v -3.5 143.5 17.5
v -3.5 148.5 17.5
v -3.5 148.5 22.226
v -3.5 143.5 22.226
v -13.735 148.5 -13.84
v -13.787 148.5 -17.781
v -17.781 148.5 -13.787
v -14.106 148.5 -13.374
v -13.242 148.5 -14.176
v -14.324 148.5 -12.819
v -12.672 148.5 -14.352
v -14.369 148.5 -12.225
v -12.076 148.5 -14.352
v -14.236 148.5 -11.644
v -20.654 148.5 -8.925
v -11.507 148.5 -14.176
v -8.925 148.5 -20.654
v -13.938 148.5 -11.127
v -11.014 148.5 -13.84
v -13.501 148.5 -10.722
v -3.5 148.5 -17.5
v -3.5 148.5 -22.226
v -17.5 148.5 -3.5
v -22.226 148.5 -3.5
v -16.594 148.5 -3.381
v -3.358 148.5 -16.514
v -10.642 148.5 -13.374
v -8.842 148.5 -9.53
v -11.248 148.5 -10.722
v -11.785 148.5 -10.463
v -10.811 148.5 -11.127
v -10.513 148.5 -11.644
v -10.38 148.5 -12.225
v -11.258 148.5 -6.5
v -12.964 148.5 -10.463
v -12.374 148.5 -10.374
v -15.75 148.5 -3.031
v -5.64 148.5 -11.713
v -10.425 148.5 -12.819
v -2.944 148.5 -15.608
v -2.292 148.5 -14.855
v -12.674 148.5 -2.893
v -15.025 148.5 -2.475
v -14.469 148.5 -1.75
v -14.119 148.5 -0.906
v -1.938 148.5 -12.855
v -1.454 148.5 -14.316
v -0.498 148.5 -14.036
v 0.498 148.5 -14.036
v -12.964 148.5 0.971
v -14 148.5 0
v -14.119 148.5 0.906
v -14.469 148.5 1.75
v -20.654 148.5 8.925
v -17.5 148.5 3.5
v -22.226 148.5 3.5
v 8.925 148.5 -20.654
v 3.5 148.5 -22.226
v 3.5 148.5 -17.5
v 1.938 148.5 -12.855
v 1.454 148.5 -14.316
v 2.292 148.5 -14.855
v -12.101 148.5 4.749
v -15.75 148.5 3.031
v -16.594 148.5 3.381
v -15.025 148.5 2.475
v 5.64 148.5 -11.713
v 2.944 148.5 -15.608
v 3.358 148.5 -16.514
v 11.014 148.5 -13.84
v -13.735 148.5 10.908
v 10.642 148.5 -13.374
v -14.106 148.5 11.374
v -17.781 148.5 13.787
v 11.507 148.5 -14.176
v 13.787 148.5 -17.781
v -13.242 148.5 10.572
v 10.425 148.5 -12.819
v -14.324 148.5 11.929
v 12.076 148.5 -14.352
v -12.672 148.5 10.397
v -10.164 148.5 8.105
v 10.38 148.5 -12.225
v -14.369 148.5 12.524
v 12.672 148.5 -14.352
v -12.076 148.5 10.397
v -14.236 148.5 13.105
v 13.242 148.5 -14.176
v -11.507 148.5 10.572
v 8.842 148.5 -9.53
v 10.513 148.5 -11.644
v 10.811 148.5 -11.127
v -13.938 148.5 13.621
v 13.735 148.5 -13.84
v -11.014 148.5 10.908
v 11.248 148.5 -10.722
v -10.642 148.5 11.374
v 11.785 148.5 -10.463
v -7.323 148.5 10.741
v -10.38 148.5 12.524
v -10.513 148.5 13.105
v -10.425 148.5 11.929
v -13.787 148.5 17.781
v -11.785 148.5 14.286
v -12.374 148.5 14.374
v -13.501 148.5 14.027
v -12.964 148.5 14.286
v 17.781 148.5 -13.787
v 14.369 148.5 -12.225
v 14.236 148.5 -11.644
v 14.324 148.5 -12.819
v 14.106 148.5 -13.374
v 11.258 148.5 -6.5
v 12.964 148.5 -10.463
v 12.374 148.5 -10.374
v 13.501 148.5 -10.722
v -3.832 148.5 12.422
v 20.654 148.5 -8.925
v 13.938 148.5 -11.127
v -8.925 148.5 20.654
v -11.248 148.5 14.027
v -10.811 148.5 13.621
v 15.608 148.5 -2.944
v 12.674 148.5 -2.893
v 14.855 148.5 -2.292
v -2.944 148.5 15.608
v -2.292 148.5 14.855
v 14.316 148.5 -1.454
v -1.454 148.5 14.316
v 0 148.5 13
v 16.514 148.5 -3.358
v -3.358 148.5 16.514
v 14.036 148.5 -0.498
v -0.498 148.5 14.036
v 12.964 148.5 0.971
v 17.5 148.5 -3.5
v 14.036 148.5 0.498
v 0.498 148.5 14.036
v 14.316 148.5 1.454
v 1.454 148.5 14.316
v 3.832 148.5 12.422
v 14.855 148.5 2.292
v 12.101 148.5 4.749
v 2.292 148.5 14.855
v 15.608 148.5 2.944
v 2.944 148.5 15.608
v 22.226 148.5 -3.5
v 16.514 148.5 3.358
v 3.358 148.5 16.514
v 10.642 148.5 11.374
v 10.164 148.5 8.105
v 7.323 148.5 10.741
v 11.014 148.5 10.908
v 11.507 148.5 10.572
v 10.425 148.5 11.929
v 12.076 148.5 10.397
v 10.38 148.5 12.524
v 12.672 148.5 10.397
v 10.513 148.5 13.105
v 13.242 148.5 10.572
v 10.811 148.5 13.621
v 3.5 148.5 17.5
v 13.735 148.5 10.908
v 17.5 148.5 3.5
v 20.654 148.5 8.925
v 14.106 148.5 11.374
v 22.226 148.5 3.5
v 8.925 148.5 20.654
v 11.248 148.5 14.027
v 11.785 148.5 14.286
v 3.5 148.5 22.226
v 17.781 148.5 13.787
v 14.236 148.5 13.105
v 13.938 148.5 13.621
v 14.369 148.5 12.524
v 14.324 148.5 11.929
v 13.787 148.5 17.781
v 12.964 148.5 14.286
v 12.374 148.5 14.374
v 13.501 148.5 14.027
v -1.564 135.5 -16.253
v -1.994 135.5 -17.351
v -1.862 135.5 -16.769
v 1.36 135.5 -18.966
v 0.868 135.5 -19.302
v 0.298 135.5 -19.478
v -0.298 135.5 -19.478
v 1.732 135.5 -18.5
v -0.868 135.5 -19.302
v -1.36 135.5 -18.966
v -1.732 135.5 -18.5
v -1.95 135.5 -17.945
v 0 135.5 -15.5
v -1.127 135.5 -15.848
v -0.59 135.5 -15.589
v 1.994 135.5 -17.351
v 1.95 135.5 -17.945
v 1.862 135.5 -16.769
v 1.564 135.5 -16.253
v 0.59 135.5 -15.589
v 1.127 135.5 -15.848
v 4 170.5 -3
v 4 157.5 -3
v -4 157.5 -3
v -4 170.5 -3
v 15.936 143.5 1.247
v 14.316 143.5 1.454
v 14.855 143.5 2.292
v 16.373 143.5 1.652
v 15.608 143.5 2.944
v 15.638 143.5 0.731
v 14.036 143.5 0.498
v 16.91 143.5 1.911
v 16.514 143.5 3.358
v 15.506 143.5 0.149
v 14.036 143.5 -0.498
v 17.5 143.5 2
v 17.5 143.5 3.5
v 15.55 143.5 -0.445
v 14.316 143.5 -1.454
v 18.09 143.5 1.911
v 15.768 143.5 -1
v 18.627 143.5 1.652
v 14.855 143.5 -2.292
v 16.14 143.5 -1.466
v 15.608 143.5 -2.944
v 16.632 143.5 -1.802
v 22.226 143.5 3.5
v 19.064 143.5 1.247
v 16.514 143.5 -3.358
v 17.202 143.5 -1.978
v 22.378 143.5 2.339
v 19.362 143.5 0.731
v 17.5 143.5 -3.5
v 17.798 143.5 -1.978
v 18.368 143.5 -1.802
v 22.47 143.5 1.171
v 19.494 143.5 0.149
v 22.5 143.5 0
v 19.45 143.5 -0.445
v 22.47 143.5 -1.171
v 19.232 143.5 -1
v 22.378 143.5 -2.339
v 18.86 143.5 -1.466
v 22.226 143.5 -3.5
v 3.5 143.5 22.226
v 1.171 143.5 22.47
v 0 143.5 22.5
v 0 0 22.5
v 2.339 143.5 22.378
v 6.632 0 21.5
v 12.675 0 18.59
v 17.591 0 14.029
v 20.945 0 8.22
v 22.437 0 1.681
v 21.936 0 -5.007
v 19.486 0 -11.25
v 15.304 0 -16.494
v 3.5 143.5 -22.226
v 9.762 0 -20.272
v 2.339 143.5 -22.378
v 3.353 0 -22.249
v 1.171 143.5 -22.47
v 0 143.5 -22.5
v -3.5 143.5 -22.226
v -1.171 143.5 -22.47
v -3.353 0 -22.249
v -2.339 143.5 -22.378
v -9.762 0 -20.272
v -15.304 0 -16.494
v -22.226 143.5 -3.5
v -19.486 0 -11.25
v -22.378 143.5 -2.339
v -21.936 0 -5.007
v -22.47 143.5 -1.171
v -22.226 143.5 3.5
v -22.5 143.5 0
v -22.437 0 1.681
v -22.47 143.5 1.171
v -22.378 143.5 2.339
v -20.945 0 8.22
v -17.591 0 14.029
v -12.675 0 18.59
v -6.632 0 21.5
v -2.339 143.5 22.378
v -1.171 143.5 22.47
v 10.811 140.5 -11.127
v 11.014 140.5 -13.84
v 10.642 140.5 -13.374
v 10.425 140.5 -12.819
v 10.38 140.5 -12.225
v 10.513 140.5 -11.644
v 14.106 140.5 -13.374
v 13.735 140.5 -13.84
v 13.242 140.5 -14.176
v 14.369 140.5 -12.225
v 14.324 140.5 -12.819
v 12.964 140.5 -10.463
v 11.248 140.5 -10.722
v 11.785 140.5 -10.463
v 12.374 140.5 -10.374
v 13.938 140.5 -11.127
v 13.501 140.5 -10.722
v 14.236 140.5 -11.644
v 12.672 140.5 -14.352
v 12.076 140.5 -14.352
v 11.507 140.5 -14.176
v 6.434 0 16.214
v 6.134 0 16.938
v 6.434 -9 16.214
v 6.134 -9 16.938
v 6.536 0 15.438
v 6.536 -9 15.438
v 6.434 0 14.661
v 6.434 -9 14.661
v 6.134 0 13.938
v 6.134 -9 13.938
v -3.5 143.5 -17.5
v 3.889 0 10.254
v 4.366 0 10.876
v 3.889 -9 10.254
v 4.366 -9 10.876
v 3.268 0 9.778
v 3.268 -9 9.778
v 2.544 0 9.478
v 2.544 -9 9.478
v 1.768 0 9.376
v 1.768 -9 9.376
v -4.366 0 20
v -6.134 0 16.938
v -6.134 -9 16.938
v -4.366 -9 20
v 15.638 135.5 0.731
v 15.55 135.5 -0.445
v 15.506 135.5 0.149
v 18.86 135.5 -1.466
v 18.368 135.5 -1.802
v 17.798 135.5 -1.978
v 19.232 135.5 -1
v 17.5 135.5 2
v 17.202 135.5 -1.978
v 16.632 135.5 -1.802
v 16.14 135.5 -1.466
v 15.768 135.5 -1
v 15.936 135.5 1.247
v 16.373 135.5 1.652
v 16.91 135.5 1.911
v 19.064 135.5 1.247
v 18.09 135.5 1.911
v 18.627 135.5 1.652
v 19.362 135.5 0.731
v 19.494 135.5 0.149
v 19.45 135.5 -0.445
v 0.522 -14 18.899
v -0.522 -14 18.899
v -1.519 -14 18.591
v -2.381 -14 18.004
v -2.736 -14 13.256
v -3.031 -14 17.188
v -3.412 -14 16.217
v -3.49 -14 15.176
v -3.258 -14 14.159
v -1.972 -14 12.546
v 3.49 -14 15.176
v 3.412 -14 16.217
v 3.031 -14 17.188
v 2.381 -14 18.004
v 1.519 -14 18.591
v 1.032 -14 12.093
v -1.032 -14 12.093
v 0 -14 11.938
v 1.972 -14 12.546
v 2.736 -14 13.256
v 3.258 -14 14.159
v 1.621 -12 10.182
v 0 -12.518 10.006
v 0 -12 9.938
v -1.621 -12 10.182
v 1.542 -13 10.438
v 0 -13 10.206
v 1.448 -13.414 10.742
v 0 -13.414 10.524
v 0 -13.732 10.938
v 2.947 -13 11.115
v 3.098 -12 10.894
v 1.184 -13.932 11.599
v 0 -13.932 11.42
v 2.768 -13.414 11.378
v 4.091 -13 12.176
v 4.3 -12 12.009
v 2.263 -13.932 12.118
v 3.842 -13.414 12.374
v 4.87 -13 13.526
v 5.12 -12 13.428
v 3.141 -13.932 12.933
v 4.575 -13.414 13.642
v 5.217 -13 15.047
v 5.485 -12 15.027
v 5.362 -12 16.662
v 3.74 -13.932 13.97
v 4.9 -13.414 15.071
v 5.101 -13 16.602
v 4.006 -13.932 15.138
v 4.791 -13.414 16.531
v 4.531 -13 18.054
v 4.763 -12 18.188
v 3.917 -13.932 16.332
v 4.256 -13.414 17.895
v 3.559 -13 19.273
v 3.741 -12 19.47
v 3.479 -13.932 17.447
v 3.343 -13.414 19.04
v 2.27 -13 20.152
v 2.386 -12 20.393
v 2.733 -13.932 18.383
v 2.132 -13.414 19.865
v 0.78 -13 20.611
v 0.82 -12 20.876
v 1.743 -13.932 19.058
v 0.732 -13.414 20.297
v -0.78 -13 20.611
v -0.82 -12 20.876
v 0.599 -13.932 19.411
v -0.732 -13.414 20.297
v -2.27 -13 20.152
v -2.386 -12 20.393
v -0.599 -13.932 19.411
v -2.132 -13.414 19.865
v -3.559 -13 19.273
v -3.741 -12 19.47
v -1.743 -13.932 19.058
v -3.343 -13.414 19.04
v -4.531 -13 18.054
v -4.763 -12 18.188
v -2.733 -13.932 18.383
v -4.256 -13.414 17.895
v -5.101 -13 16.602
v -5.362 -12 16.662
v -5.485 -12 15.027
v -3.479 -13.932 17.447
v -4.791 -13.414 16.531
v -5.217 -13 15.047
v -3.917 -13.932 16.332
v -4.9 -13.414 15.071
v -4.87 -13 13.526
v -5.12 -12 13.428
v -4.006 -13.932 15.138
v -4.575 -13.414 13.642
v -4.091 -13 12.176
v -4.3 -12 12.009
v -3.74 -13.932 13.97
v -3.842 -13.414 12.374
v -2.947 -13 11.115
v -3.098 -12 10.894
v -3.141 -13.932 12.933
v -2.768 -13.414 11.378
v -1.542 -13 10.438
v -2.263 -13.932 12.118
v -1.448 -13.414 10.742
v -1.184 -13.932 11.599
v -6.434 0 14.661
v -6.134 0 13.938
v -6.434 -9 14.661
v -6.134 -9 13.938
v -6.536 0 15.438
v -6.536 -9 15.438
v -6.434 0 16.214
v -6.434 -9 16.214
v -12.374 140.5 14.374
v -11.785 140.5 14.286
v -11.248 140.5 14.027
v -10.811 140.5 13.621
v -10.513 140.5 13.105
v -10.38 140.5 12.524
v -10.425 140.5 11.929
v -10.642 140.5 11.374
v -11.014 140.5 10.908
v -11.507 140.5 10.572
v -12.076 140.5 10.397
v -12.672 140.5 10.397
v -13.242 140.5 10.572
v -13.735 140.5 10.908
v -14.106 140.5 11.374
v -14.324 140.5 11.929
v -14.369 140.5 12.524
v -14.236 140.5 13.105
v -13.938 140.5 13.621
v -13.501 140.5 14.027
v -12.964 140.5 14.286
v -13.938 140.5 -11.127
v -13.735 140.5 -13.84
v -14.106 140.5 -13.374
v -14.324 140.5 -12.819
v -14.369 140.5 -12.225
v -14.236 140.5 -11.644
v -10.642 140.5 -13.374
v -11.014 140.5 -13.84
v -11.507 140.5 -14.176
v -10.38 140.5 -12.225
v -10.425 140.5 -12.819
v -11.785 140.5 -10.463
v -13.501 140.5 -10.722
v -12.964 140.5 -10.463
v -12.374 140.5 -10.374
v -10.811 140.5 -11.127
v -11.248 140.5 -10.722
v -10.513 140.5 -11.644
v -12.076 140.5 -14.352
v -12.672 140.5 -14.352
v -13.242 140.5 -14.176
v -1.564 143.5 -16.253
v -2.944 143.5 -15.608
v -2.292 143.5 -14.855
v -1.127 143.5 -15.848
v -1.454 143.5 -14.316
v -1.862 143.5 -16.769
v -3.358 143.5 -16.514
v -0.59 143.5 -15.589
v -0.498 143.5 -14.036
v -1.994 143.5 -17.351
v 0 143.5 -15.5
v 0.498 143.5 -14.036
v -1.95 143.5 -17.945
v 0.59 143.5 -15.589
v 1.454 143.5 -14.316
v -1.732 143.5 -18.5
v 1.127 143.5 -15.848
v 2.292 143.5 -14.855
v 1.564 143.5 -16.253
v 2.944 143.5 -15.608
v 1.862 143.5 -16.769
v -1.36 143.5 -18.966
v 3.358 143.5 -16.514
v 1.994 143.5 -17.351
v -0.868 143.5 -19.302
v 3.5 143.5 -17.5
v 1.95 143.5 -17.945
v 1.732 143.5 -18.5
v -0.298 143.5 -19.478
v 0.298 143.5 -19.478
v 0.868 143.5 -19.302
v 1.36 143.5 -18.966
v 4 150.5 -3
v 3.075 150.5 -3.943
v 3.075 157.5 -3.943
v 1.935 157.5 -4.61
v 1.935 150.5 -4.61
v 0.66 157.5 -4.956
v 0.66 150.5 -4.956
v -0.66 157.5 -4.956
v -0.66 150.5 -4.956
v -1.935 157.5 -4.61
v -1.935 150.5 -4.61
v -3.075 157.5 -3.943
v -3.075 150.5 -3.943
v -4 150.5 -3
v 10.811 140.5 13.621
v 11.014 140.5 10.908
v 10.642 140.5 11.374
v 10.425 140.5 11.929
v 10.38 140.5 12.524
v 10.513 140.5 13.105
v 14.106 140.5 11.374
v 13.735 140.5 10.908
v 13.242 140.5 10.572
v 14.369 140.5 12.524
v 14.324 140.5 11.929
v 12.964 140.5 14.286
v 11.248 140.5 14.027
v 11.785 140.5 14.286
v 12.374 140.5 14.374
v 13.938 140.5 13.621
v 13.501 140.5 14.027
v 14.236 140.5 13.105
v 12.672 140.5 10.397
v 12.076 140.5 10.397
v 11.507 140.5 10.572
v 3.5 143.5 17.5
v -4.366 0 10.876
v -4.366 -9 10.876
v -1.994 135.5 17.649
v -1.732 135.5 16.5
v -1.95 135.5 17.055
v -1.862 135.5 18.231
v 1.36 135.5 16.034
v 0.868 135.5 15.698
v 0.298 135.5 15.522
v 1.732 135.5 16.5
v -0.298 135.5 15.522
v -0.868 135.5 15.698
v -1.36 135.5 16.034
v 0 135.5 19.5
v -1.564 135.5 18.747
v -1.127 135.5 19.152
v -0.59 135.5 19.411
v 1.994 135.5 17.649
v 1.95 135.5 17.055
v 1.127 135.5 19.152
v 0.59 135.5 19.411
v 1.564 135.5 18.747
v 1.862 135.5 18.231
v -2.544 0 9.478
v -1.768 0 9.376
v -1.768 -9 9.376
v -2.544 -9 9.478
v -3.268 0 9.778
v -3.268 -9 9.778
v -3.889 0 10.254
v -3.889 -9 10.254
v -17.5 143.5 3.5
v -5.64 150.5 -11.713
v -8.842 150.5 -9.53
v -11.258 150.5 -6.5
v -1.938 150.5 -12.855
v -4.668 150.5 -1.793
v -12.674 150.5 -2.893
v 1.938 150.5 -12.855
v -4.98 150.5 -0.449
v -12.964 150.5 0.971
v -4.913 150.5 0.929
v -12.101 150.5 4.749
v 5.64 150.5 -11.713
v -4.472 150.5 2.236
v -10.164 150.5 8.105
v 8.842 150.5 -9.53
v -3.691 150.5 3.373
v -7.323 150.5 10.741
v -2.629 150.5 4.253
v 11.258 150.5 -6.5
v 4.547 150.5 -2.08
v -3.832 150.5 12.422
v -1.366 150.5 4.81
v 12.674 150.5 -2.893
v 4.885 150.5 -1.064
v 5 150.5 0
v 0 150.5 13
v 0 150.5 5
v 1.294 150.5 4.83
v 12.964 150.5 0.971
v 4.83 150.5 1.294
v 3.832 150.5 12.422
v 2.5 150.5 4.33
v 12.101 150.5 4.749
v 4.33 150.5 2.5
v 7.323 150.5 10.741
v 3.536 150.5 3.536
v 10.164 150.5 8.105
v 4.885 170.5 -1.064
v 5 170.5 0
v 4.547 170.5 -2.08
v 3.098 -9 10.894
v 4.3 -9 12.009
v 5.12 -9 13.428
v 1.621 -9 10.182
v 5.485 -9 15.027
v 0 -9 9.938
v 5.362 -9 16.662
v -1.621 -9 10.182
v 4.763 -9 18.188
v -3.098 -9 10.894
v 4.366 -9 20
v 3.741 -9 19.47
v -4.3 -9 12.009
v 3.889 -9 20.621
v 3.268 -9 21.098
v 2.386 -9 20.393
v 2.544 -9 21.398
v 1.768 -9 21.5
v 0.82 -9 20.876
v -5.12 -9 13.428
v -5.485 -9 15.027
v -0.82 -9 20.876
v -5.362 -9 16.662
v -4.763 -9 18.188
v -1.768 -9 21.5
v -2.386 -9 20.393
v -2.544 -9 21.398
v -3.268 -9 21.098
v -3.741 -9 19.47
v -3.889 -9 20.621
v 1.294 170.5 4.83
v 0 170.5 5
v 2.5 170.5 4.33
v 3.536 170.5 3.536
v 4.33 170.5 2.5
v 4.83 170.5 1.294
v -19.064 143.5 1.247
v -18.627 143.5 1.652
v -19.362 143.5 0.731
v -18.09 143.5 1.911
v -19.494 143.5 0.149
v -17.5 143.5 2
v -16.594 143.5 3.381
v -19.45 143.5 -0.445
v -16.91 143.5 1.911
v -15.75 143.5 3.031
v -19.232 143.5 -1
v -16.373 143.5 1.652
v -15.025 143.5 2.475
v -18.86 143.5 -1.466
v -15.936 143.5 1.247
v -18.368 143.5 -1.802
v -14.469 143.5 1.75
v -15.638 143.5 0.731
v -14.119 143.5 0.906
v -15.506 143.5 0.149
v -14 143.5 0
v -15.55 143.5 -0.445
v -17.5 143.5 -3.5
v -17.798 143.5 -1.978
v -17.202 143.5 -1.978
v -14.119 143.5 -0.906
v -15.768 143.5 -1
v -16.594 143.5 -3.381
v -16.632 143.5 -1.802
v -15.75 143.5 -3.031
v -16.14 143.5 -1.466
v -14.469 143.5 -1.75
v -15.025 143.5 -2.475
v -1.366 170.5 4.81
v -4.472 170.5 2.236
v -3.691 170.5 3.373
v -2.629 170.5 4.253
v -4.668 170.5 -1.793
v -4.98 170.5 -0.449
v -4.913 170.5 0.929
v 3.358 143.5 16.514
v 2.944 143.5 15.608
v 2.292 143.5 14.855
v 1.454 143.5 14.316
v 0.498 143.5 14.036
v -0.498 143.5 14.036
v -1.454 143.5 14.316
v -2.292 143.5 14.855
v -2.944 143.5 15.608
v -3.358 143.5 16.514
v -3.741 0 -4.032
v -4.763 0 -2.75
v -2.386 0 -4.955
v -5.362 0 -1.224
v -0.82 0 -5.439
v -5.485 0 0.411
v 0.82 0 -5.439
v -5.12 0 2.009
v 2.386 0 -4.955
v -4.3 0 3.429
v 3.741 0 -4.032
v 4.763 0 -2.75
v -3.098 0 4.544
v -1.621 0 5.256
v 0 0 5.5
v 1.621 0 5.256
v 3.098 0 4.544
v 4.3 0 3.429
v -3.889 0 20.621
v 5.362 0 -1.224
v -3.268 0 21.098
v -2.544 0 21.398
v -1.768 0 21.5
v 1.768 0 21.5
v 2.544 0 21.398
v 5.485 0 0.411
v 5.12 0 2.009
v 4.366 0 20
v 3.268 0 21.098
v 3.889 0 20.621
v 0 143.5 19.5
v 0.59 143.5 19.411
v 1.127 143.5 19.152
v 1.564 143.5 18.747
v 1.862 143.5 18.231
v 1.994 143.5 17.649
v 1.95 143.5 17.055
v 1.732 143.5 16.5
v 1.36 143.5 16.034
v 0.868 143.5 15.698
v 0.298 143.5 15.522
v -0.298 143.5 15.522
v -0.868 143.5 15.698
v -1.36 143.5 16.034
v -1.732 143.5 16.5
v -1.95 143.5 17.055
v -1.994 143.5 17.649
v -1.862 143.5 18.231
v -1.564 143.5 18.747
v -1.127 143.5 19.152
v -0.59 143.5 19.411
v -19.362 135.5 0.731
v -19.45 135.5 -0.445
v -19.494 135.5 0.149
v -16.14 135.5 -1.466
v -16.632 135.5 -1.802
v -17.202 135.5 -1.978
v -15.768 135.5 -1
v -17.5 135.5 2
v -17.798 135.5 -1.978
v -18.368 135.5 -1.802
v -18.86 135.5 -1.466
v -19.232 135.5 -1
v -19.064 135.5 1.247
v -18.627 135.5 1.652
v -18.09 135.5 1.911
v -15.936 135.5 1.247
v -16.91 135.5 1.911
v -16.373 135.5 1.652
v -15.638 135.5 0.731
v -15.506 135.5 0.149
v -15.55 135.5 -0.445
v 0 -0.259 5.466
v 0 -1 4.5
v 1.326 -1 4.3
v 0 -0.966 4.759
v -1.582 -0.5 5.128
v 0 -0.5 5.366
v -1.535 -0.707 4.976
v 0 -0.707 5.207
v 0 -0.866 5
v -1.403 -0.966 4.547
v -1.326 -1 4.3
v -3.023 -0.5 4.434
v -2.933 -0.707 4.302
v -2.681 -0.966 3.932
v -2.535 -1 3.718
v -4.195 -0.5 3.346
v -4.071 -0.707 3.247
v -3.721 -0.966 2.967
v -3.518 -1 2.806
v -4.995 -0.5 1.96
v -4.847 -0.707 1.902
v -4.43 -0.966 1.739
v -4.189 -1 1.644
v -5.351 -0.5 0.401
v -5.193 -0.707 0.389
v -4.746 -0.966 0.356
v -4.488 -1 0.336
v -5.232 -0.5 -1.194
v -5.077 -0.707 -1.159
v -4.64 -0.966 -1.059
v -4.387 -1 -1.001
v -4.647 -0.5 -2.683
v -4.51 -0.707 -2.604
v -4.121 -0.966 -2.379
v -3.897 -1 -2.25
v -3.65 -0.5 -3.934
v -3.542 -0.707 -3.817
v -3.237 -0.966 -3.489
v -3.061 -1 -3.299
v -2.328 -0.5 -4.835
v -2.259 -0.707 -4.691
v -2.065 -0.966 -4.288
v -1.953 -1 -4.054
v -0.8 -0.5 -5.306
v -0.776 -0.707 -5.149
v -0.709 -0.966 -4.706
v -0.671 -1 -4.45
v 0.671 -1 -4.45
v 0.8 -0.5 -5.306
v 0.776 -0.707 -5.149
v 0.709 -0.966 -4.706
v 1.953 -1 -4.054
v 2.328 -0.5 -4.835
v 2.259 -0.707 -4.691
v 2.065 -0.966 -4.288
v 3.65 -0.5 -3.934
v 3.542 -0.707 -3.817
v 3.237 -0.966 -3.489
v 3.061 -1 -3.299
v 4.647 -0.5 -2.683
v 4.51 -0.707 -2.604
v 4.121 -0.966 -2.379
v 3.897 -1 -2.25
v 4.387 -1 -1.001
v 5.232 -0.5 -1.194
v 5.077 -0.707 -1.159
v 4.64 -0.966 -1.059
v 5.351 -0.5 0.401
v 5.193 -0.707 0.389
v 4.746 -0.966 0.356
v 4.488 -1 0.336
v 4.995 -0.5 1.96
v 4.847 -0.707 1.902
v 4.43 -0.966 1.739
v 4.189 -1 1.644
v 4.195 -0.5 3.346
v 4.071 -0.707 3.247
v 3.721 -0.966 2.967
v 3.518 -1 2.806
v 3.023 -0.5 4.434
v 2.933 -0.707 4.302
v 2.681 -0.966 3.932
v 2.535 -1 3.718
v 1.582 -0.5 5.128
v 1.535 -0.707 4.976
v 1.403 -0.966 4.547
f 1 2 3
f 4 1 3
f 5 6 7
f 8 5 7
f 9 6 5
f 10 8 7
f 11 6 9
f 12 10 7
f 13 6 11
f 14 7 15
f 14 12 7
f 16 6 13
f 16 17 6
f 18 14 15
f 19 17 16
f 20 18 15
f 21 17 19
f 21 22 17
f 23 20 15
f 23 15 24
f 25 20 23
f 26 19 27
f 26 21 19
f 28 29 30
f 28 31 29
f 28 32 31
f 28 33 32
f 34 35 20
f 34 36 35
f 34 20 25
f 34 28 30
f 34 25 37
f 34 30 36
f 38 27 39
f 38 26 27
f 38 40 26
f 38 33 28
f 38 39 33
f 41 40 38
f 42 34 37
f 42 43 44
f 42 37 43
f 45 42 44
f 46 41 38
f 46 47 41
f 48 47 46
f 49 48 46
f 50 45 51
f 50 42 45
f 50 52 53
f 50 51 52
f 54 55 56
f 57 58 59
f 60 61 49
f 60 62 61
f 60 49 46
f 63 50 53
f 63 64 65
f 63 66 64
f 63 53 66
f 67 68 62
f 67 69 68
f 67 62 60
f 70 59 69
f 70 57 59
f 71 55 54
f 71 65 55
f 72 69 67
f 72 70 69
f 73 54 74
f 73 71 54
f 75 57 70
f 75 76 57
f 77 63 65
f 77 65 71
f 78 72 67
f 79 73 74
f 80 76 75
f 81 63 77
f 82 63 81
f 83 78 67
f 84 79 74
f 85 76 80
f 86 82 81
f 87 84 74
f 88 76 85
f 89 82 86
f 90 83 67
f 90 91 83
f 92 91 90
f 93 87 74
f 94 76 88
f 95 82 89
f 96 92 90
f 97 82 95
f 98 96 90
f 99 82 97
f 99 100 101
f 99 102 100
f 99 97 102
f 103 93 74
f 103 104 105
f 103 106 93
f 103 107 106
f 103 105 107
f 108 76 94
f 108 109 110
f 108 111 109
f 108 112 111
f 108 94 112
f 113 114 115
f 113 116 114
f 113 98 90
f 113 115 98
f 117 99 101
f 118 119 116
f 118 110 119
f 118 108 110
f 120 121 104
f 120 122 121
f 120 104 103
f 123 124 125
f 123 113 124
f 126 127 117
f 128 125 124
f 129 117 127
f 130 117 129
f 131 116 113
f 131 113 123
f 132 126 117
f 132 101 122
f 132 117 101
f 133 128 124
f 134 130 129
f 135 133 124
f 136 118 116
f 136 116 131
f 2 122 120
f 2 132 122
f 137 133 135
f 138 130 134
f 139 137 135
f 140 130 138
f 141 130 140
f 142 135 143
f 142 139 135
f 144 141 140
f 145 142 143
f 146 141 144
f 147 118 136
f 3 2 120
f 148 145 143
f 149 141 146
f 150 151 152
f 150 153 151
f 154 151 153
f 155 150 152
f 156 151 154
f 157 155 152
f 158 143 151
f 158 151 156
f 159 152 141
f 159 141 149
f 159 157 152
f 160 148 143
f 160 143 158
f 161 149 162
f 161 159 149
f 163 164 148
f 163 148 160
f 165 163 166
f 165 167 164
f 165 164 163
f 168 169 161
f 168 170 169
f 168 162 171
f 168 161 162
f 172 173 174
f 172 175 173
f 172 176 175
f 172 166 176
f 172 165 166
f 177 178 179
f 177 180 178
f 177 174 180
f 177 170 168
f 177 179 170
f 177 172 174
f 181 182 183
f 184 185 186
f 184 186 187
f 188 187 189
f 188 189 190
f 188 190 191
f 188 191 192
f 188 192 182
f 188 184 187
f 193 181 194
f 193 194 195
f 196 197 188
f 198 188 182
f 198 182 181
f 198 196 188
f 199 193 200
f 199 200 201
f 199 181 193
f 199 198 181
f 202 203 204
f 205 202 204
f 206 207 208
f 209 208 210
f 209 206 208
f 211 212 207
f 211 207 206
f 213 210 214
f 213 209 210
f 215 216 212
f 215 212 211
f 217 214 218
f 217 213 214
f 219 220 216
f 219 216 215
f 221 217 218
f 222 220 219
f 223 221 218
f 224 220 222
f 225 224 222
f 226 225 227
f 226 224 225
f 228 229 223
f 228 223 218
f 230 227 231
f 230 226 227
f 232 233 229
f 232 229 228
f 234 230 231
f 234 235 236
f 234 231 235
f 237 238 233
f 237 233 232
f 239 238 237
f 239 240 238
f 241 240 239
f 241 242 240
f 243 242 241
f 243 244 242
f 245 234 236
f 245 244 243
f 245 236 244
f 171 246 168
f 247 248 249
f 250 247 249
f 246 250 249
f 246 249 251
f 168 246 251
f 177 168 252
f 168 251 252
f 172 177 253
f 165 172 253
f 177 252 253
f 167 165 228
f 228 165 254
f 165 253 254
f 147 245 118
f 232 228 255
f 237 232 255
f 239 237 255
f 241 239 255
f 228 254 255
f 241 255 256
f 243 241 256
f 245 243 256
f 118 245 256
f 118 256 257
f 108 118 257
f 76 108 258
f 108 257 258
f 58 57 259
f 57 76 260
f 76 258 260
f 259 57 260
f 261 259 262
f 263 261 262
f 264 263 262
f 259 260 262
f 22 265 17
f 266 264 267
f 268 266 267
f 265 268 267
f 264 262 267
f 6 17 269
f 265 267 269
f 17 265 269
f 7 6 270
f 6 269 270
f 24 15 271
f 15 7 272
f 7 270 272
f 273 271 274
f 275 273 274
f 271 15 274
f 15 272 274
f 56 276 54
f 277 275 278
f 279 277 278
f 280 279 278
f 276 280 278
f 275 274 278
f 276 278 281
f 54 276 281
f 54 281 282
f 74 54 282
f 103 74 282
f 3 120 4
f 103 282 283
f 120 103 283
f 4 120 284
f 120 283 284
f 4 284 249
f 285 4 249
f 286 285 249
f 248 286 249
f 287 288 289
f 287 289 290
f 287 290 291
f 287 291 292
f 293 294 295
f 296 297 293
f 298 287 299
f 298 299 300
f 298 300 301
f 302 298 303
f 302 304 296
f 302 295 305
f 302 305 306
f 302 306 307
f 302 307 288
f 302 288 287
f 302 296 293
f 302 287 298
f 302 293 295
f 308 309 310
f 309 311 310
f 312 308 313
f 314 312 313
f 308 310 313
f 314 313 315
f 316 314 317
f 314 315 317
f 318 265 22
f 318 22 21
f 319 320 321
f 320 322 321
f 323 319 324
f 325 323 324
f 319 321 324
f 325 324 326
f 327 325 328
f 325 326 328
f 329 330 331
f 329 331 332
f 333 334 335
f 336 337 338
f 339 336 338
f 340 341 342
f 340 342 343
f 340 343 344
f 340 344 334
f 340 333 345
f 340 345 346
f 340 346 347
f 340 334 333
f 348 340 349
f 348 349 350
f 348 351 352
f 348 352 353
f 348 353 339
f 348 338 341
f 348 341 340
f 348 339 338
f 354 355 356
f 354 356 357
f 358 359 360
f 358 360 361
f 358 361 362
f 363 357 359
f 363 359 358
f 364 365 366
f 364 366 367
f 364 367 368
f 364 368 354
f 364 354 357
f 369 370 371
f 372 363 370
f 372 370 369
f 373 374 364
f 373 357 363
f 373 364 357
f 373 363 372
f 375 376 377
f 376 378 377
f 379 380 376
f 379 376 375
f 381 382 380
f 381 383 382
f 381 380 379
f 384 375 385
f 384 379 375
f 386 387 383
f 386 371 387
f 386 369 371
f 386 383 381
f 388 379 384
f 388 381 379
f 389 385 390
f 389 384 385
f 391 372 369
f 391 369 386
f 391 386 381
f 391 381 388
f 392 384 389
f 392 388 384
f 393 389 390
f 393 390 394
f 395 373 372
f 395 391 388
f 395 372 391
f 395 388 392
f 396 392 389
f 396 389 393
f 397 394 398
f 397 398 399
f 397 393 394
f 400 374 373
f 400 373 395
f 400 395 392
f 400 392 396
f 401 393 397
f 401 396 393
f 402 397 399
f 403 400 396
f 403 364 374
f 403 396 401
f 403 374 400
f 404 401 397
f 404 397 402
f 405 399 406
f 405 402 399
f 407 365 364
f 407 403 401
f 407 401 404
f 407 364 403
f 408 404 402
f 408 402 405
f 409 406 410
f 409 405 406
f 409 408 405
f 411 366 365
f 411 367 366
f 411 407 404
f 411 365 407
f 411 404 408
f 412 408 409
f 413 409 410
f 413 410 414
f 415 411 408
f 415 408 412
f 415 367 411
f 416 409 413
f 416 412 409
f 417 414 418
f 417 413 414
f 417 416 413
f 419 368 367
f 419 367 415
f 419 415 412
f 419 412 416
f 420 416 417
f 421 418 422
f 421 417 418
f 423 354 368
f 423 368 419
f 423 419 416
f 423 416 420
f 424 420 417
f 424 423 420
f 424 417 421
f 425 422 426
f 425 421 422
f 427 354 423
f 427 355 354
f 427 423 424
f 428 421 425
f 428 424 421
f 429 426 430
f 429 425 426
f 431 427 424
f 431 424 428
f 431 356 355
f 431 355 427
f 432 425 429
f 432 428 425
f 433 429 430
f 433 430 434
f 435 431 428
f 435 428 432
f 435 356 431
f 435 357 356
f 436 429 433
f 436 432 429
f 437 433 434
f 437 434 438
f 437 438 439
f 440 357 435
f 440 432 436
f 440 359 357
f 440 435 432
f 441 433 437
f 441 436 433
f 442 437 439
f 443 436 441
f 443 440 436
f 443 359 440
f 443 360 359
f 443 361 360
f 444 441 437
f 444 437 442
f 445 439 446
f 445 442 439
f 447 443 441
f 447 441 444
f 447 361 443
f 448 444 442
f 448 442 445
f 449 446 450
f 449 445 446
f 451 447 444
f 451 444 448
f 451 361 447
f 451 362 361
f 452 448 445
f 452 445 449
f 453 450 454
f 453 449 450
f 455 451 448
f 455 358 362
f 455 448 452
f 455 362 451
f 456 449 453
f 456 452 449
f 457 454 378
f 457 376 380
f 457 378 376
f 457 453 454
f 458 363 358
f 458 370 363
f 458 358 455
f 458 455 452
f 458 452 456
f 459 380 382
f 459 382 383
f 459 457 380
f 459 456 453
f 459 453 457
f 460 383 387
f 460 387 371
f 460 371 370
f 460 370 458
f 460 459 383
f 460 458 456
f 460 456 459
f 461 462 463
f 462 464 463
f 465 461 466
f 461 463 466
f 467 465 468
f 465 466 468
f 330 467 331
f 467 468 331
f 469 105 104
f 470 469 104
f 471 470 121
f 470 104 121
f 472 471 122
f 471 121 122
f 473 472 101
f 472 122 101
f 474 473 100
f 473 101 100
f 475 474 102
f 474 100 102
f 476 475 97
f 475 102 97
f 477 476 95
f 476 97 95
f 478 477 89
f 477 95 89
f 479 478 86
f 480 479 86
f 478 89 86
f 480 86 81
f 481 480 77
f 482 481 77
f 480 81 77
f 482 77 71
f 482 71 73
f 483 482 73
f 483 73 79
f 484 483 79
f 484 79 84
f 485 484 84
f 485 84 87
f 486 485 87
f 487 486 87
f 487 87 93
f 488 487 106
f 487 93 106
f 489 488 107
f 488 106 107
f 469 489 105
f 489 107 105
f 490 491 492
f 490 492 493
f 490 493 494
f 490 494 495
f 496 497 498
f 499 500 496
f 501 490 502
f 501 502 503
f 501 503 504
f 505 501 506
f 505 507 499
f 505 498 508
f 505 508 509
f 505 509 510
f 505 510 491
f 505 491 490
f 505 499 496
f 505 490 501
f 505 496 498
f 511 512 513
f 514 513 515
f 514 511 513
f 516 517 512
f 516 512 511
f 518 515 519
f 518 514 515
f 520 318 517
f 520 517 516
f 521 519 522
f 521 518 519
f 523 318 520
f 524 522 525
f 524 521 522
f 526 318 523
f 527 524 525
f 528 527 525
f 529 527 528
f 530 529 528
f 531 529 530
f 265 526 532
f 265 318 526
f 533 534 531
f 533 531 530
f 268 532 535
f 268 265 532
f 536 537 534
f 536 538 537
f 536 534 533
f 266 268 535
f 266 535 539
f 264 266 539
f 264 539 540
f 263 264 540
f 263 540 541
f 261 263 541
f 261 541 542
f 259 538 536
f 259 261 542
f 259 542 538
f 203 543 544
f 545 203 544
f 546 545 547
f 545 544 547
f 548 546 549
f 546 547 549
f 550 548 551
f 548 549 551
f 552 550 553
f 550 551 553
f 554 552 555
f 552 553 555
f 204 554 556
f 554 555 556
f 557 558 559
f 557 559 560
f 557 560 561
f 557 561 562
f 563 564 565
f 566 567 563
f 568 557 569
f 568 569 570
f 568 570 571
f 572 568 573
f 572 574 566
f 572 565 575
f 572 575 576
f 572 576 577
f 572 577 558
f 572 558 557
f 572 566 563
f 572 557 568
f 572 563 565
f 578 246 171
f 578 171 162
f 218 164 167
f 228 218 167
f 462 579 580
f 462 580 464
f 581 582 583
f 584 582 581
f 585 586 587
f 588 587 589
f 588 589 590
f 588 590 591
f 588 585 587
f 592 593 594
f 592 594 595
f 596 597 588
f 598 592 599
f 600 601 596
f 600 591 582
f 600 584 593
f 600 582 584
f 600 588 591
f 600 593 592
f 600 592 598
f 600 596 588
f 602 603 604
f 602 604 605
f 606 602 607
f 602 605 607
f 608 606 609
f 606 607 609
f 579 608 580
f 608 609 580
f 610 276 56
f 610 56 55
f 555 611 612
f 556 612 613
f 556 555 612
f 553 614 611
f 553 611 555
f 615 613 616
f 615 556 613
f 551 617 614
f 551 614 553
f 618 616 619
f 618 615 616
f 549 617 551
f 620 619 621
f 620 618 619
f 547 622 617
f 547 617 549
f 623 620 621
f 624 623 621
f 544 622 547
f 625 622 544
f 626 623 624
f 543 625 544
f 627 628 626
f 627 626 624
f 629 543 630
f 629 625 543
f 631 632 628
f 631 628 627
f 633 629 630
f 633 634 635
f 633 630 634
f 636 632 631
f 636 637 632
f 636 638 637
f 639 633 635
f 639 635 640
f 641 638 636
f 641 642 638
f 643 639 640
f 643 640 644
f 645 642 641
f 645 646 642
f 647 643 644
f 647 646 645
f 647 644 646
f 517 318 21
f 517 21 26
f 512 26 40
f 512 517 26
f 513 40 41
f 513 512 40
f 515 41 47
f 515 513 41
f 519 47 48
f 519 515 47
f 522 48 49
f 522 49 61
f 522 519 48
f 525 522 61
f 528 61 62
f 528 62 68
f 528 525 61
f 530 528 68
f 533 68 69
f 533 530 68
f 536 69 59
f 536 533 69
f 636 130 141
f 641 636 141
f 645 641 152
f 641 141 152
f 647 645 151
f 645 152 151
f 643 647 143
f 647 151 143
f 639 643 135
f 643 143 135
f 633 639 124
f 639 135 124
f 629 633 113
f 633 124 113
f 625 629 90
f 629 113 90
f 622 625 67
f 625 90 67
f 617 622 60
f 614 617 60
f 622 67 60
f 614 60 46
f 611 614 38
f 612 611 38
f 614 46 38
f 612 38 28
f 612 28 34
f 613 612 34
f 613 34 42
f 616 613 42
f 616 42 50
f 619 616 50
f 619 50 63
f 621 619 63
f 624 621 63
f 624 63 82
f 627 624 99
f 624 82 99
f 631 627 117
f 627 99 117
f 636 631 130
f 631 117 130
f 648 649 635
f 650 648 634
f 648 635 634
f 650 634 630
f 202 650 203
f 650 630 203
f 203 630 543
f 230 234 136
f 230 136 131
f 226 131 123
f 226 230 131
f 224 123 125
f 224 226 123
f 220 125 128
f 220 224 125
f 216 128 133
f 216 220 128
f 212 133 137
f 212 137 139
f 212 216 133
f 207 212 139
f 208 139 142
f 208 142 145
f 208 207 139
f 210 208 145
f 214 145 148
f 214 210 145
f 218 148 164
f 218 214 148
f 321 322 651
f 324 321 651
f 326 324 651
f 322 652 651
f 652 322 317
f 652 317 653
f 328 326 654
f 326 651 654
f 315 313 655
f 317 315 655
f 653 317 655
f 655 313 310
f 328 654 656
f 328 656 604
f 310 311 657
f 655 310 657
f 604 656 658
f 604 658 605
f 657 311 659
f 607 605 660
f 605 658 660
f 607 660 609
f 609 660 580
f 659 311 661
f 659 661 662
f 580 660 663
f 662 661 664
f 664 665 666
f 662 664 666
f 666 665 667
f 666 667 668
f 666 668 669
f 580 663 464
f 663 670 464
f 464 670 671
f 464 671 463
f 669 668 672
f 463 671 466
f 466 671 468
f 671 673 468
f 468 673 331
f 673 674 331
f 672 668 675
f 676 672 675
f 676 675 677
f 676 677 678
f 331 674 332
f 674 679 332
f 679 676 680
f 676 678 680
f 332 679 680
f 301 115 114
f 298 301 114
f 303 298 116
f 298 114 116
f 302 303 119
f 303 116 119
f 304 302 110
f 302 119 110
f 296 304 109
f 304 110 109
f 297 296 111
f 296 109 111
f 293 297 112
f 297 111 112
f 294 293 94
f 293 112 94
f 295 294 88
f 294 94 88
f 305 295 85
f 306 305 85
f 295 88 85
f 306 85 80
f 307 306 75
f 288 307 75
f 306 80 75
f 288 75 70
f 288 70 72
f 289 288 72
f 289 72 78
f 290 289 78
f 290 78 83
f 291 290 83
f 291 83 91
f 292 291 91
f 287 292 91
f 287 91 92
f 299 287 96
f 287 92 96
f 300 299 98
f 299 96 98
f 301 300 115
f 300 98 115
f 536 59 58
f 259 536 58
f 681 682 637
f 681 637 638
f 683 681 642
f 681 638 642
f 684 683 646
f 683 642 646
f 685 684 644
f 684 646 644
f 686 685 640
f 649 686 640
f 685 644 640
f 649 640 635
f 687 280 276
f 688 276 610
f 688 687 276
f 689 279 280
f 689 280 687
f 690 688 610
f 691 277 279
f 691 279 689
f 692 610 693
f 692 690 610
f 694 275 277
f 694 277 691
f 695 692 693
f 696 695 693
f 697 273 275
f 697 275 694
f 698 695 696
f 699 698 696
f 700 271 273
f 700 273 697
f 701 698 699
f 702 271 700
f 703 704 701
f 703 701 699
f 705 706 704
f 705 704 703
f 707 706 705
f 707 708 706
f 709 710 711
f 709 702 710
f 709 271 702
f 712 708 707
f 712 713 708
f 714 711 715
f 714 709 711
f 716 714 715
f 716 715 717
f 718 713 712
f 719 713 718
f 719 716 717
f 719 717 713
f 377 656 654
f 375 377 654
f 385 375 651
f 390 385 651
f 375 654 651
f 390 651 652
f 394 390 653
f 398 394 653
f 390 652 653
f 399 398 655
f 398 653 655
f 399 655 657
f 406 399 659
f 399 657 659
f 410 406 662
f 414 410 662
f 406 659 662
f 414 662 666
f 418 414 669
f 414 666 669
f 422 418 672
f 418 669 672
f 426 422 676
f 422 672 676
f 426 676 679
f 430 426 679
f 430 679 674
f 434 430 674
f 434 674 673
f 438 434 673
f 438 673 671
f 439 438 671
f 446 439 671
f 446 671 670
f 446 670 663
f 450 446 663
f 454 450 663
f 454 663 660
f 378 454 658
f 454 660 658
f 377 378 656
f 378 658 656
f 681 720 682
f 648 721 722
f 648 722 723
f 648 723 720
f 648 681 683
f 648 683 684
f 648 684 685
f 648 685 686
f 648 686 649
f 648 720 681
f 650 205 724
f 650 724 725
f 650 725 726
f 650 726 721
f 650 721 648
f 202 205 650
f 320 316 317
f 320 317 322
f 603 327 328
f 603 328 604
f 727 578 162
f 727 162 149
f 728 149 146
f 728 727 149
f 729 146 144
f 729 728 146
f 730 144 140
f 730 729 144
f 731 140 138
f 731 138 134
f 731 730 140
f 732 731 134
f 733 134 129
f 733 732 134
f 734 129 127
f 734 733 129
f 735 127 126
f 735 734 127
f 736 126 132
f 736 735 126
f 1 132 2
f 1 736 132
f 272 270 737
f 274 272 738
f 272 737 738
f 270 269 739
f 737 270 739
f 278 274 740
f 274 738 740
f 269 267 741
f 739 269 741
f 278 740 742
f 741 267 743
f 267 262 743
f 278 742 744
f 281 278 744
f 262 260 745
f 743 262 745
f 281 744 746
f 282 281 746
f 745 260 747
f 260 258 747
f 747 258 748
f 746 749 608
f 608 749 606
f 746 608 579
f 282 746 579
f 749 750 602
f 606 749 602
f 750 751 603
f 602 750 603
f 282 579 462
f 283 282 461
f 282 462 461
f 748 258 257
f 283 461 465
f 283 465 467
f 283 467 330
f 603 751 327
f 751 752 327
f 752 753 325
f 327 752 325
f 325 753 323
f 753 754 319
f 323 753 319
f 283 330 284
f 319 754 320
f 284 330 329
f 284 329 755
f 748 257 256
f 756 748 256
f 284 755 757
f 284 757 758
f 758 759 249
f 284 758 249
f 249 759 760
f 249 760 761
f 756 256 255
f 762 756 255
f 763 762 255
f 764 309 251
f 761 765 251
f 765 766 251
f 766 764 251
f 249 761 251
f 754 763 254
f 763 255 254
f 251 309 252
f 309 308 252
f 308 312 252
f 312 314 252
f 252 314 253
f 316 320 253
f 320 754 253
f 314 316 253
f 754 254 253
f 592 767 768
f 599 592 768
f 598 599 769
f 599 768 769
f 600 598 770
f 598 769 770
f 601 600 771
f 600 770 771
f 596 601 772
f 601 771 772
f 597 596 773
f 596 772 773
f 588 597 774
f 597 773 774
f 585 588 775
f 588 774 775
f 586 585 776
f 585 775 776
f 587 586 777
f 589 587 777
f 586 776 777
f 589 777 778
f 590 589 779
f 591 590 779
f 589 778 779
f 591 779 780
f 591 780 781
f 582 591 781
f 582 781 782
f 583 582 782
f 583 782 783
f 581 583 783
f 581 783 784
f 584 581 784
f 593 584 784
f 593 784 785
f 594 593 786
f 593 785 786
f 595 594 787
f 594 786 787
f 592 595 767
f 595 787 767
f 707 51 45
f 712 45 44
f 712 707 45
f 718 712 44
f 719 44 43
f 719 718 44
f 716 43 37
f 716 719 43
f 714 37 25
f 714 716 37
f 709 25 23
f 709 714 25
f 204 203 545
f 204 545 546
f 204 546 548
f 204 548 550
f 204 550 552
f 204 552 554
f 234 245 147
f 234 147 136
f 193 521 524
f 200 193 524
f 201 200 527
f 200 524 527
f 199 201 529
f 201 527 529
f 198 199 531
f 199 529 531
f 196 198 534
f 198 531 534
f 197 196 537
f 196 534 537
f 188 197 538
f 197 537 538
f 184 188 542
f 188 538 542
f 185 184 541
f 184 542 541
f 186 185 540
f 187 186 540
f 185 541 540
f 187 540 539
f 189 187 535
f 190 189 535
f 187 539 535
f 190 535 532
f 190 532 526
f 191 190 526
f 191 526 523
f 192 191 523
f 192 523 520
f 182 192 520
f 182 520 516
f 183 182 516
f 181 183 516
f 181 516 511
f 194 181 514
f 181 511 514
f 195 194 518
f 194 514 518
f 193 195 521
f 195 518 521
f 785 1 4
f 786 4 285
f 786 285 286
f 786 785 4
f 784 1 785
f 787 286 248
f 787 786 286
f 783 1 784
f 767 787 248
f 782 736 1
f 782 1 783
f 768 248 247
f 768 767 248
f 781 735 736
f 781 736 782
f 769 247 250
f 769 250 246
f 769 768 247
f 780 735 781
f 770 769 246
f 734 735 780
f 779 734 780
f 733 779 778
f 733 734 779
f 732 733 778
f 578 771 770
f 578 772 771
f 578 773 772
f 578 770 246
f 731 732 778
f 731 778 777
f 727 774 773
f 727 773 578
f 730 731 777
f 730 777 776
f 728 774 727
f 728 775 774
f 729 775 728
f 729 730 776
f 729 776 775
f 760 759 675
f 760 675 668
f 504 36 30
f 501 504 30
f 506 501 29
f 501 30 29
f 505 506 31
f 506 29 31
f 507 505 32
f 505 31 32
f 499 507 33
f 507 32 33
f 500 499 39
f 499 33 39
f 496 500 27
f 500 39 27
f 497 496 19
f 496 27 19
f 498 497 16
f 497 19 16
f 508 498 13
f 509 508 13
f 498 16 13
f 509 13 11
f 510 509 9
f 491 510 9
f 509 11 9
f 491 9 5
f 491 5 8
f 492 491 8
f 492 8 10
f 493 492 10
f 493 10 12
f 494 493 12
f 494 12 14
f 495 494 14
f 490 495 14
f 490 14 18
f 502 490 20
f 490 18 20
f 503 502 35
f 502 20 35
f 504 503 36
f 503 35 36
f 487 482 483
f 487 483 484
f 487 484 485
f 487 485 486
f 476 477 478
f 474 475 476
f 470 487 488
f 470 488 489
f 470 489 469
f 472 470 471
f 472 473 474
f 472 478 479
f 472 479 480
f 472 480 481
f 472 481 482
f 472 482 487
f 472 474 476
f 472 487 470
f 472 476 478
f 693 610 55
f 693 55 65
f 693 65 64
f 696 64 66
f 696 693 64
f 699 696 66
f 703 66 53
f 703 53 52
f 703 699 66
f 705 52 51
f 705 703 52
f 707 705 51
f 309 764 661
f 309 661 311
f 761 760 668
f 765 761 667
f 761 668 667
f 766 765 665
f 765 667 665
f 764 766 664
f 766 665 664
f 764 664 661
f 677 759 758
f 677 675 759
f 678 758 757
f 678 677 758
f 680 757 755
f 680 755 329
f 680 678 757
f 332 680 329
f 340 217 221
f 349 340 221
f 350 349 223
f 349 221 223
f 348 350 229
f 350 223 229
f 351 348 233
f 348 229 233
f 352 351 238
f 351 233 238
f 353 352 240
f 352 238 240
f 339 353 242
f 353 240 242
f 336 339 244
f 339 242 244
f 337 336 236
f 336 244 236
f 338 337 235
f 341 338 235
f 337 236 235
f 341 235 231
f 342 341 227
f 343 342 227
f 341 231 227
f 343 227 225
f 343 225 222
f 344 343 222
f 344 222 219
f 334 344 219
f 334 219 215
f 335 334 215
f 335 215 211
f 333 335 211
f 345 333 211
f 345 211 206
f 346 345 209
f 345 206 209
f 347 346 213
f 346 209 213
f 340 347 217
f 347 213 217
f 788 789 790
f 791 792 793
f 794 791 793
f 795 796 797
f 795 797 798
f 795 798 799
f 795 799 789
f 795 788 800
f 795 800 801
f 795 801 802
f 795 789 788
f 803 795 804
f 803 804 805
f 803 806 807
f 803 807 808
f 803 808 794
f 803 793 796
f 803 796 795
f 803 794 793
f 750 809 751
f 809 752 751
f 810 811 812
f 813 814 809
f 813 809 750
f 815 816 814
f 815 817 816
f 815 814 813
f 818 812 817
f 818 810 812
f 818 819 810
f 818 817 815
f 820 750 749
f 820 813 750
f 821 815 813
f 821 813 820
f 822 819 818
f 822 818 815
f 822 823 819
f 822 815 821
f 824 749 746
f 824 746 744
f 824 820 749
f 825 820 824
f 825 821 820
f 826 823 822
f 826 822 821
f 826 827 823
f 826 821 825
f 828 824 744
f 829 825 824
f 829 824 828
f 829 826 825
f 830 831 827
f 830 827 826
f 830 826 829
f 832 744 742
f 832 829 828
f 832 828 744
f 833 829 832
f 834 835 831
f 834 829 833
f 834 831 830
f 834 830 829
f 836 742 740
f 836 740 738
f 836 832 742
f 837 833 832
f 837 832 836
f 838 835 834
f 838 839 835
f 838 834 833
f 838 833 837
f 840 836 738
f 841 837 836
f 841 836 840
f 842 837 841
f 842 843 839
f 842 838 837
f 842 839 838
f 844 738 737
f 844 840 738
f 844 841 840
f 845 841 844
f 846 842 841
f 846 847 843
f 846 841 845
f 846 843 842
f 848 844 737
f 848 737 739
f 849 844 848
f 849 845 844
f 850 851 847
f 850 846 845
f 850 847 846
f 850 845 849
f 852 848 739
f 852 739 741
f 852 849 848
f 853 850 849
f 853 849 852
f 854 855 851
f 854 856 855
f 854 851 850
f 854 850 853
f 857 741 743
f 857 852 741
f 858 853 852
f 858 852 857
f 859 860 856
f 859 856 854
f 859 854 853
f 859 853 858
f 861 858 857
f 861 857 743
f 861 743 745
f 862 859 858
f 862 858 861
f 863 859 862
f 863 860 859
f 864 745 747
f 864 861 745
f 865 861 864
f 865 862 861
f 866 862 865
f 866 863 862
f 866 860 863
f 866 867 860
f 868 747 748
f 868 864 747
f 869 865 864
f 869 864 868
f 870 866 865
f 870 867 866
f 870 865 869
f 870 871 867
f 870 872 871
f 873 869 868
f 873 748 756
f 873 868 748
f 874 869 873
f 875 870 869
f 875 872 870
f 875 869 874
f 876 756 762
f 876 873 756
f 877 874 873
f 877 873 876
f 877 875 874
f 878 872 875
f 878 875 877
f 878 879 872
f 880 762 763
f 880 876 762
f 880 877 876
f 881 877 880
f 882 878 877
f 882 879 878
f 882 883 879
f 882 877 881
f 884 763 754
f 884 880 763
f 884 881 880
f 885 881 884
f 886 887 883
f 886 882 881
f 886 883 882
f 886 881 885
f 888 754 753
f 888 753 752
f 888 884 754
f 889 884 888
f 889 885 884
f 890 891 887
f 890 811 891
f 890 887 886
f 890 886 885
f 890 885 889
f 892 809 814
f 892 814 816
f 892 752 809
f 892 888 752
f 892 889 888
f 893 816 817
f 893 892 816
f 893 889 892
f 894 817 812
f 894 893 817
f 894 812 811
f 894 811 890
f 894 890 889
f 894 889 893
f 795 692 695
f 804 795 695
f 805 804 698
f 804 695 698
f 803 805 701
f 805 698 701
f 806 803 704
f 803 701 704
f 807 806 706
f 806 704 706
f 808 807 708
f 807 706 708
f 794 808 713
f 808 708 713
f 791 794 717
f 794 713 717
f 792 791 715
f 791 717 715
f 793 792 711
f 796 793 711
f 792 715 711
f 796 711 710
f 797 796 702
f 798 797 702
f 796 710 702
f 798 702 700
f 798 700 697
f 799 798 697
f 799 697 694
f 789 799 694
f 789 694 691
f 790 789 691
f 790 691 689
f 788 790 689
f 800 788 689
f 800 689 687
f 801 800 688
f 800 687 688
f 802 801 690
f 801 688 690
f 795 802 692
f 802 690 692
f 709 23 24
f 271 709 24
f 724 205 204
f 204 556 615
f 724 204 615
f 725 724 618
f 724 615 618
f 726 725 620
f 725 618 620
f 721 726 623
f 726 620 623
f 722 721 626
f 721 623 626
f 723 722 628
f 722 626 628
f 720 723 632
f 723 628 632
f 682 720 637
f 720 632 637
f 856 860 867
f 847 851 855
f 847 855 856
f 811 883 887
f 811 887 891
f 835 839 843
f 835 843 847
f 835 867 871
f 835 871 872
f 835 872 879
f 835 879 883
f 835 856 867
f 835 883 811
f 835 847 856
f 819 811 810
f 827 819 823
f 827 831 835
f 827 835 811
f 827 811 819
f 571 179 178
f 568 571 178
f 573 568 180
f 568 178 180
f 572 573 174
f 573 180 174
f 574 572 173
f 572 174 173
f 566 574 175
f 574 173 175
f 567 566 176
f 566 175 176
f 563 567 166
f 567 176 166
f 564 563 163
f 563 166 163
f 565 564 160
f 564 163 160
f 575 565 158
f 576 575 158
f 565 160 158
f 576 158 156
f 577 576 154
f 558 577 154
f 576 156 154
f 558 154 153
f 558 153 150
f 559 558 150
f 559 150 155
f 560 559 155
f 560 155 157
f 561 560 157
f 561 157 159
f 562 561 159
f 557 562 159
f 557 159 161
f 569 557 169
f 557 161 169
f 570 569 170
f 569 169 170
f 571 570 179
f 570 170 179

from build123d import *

# Parameters (mm, degrees)
SKETCH1_R           = 22.5
BOSS_EXTRUDE1_DEPTH = 78
SKETCH2_R           = 22.5
BOSS_EXTRUDE2_DEPTH = 70.5
SKETCH3_R           = 13
BOSS_EXTRUDE3_DEPTH = 2
BOSS_EXTRUDE4_DEPTH = 20
SKETCH5_R           = 5
BOSS_EXTRUDE5_DEPTH = 7
SKETCH6_R           = 2
CUT_EXTRUDE1_DEPTH  = 8
CUT_EXTRUDE2_START  = -5
CUT_EXTRUDE2_DEPTH  = 5
SKETCH8_R           = 2
CUT_EXTRUDE3_DEPTH  = 8
BOSS_EXTRUDE6_DEPTH = 9
SKETCH10_R          = 5.5
BOSS_EXTRUDE7_DEPTH = 5
FILLET1_R           = 3
FILLET2_R           = 2
SKETCH11_R          = 5.5
BOSS_EXTRUDE8_DEPTH = 1
FILLET3_R           = 1


with BuildPart() as part:
    # Sketch1 → Boss-Extrude1 (new body)
    with BuildSketch(Plane(origin=(0, 0, 0), x_dir=(1, 0, 0), z_dir=(0, 1, 0))):
        with Locations(Location((0, 0, 0), (0, 0, 270))):
            Circle(SKETCH1_R)
    extrude(amount=BOSS_EXTRUDE1_DEPTH)

    # Sketch2 → Boss-Extrude2 (add)
    with BuildSketch(Plane(origin=(0, 78, 0), x_dir=(1, 0, 0), z_dir=(0, 1, 0))):
        with Locations(Location((0, 0, 0), (0, 0, 270))):
            Circle(SKETCH2_R)
    extrude(amount=BOSS_EXTRUDE2_DEPTH)

    # Sketch3 → Boss-Extrude3 (add)
    with BuildSketch(Plane(origin=(0, 148.5, 0), x_dir=(1, 0, 0), z_dir=(0, 1, 0))):
        with Locations(Location((0, 0, 0), (0, 0, 270))):
            Circle(SKETCH3_R)
    extrude(amount=BOSS_EXTRUDE3_DEPTH)

    # Sketch4 → Boss-Extrude4 (add)
    with BuildSketch(Plane(origin=(0, 150.5, 0), x_dir=(1, 0, 0), z_dir=(0, 1, 0))):
        with BuildLine():
            ThreePointArc((-4, 3), (-4.472135955, -2.236067977), (0, -5))
            Line((0, -5), (0, 3))
            Line((0, 3), (-4, 3))
        make_face()
        with BuildLine():
            Line((0, 3), (0, -5))
            ThreePointArc((0, -5), (3.535533906, -3.535533906), (5, 0))
            ThreePointArc((5, 0), (4.74341649, 1.58113883), (4, 3))
            Line((4, 3), (0, 3))
        make_face()
    extrude(amount=BOSS_EXTRUDE4_DEPTH)

    # Sketch5 → Boss-Extrude5 (add)
    with BuildSketch(Plane(origin=(0, 150.5, 0), x_dir=(1, 0, 0), z_dir=(0, 1, 0))):
        with Locations(Location((0, 0, 0), (0, 0, 143.130102354))):
            Circle(SKETCH5_R)
    extrude(amount=BOSS_EXTRUDE5_DEPTH)

    # Sketch6 → Cut-Extrude1 (cut)
    with BuildSketch(Plane(origin=(0, 148.5, 0), x_dir=(1, 0, 0), z_dir=(0, 1, 0))):
        with Locations(Location((-12.374368671, 12.374368671, 0), (0, 0, 270))):
            Circle(SKETCH6_R)
        with Locations(Location((12.374368671, 12.374368671, 0), (0, 0, 270))):
            Circle(SKETCH6_R)
        with Locations(Location((12.374368671, -12.374368671, 0), (0, 0, 270))):
            Circle(SKETCH6_R)
        with Locations(Location((-12.374368671, -12.374368671, 0), (0, 0, 270))):
            Circle(SKETCH6_R)
    extrude(amount=-CUT_EXTRUDE1_DEPTH, mode=Mode.SUBTRACT)

    # Sketch7 → Cut-Extrude2 (cut)
    with BuildSketch(Plane(origin=(0, 148.5, 0), x_dir=(1, 0, 0), z_dir=(0, 1, 0)).offset(CUT_EXTRUDE2_START)):
        with BuildLine():
            ThreePointArc((22.5, 0), (22.431423187, 1.755350058), (22.226110771, 3.5))
            Line((22.226110771, 3.5), (17.5, 3.5))
            ThreePointArc((17.5, 3.5), (19.974873734, 2.474873734), (21, 0))
            ThreePointArc((21, 0), (19.974873734, -2.474873734), (17.5, -3.5))
            Line((17.5, -3.5), (22.226110771, -3.5))
            ThreePointArc((22.226110771, -3.5), (22.431423187, -1.755350058), (22.5, 0))
        make_face()
        with BuildLine():
            ThreePointArc((21, 0), (19.974873734, 2.474873734), (17.5, 3.5))
            Line((17.5, 3.5), (17.5, -3.5))
            ThreePointArc((17.5, -3.5), (19.974873734, -2.474873734), (21, 0))
        make_face()
        with BuildLine():
            Line((17.5, -3.5), (17.5, 3.5))
            ThreePointArc((17.5, 3.5), (14, 0), (17.5, -3.5))
        make_face()
        with BuildLine():
            ThreePointArc((3.5, 22.226110771), (1.755350006, 22.431423191), (-1.05e-07, 22.5))
            ThreePointArc((-1.05e-07, 22.5), (-1.755350111, 22.431423182), (-3.5, 22.226110771))
            Line((-3.5, 22.226110771), (-3.5, 17.5))
            ThreePointArc((-3.5, 17.5), (0, 21), (3.5, 17.5))
            Line((3.5, 17.5), (3.5, 22.226110771))
        make_face()
        with BuildLine():
            ThreePointArc((3.5, 17.5), (0, 21), (-3.5, 17.5))
            Line((-3.5, 17.5), (3.5, 17.5))
        make_face()
        with BuildLine():
            Line((3.5, 17.5), (-3.5, 17.5))
            ThreePointArc((-3.5, 17.5), (0, 14), (3.5, 17.5))
        make_face()
        with BuildLine():
            ThreePointArc((-14, 0), (-15.025126266, 2.474873734), (-17.5, 3.5))
            Line((-17.5, 3.5), (-17.5, -3.5))
            ThreePointArc((-17.5, -3.5), (-15.025126266, -2.474873734), (-14, 0))
        make_face()
        with BuildLine():
            Line((-17.5, -3.5), (-17.5, 3.5))
            ThreePointArc((-17.5, 3.5), (-21, 0), (-17.5, -3.5))
        make_face()
        with BuildLine():
            Line((-17.5, 3.5), (-22.226110771, 3.5))
            ThreePointArc((-22.226110771, 3.5), (-22.431423191, 1.755350006), (-22.5, -1.05e-07))
            ThreePointArc((-22.5, -1.05e-07), (-22.431423182, -1.755350111), (-22.226110771, -3.5))
            Line((-22.226110771, -3.5), (-17.5, -3.5))
            ThreePointArc((-17.5, -3.5), (-21, 0), (-17.5, 3.5))
        make_face()
        with BuildLine():
            ThreePointArc((3.5, -17.5), (0, -14), (-3.5, -17.5))
            Line((-3.5, -17.5), (3.5, -17.5))
        make_face()
        with BuildLine():
            Line((3.5, -17.5), (-3.5, -17.5))
            ThreePointArc((-3.5, -17.5), (0, -21), (3.5, -17.5))
        make_face()
        with BuildLine():
            Line((-3.5, -17.5), (-3.5, -22.226110771))
            ThreePointArc((-3.5, -22.226110771), (-1.755350006, -22.431423191), (1.05e-07, -22.5))
            ThreePointArc((1.05e-07, -22.5), (1.755350111, -22.431423182), (3.5, -22.226110771))
            Line((3.5, -22.226110771), (3.5, -17.5))
            ThreePointArc((3.5, -17.5), (0, -21), (-3.5, -17.5))
        make_face()
    extrude(amount=CUT_EXTRUDE2_DEPTH, mode=Mode.SUBTRACT)

    # Sketch8 → Cut-Extrude3 (cut)
    with BuildSketch(Plane(origin=(0, 143.5, 0), x_dir=(1, 0, 0), z_dir=(0, 1, 0))):
        with Locations(Location((0, 17.5, 0), (0, 0, 270))):
            Circle(SKETCH8_R)
        with Locations(Location((17.5, 0, 0), (0, 0, 270))):
            Circle(SKETCH8_R)
        with Locations(Location((0, -17.5, 0), (0, 0, 270))):
            Circle(SKETCH8_R)
        with Locations(Location((-17.5, 0, 0), (0, 0, 270))):
            Circle(SKETCH8_R)
    extrude(amount=-CUT_EXTRUDE3_DEPTH, mode=Mode.SUBTRACT)

    # Sketch9 → Boss-Extrude6 (add)
    with BuildSketch(Plane.XZ):
        Polygon((-3.5, 21.5), (3.5, 21.5), (7, 15.437822174), (3.5, 9.375644347), (-3.5, 9.375644347), (-7, 15.437822174), align=None)
    extrude(amount=BOSS_EXTRUDE6_DEPTH)

    # Sketch10 → Boss-Extrude7 (add)
    with BuildSketch(Plane.XZ.offset(9)):
        with Locations(Location((0, 15.437822174, 0), (0, 0, 270))):
            Circle(SKETCH10_R)
    extrude(amount=BOSS_EXTRUDE7_DEPTH)

    # Fillet1
    fillet1_edges = [part.edges().sort_by_distance(p)[0] for p in [
        (-3.5, -4.5, 21.5),
        (-7, -4.5, 15.437822174),
        (-3.5, -4.5, 9.375644347),
        (3.5, -4.5, 9.375644347),
        (7, -4.5, 15.437822174),
        (3.5, -4.5, 21.5),
    ]]
    fillet(fillet1_edges, radius=FILLET1_R)

    # Fillet2
    fillet2_edges = [part.edges().sort_by_distance(p)[0] for p in [
        (0, -14, 20.937822174),
    ]]
    fillet(fillet2_edges, radius=FILLET2_R)

    # Sketch11 → Boss-Extrude8 (add)
    with BuildSketch(Plane.XZ):
        with Locations(Location((0, 0, 0), (0, 0, 90))):
            Circle(SKETCH11_R)
    extrude(amount=BOSS_EXTRUDE8_DEPTH)

    # Fillet3
    fillet3_edges = [part.edges().sort_by_distance(p)[0] for p in [
        (0, -1, -5.5),
    ]]
    fillet(fillet3_edges, radius=FILLET3_R - 0.0001)  # a hair under: the kernel refuses the full size


solid = part.part
